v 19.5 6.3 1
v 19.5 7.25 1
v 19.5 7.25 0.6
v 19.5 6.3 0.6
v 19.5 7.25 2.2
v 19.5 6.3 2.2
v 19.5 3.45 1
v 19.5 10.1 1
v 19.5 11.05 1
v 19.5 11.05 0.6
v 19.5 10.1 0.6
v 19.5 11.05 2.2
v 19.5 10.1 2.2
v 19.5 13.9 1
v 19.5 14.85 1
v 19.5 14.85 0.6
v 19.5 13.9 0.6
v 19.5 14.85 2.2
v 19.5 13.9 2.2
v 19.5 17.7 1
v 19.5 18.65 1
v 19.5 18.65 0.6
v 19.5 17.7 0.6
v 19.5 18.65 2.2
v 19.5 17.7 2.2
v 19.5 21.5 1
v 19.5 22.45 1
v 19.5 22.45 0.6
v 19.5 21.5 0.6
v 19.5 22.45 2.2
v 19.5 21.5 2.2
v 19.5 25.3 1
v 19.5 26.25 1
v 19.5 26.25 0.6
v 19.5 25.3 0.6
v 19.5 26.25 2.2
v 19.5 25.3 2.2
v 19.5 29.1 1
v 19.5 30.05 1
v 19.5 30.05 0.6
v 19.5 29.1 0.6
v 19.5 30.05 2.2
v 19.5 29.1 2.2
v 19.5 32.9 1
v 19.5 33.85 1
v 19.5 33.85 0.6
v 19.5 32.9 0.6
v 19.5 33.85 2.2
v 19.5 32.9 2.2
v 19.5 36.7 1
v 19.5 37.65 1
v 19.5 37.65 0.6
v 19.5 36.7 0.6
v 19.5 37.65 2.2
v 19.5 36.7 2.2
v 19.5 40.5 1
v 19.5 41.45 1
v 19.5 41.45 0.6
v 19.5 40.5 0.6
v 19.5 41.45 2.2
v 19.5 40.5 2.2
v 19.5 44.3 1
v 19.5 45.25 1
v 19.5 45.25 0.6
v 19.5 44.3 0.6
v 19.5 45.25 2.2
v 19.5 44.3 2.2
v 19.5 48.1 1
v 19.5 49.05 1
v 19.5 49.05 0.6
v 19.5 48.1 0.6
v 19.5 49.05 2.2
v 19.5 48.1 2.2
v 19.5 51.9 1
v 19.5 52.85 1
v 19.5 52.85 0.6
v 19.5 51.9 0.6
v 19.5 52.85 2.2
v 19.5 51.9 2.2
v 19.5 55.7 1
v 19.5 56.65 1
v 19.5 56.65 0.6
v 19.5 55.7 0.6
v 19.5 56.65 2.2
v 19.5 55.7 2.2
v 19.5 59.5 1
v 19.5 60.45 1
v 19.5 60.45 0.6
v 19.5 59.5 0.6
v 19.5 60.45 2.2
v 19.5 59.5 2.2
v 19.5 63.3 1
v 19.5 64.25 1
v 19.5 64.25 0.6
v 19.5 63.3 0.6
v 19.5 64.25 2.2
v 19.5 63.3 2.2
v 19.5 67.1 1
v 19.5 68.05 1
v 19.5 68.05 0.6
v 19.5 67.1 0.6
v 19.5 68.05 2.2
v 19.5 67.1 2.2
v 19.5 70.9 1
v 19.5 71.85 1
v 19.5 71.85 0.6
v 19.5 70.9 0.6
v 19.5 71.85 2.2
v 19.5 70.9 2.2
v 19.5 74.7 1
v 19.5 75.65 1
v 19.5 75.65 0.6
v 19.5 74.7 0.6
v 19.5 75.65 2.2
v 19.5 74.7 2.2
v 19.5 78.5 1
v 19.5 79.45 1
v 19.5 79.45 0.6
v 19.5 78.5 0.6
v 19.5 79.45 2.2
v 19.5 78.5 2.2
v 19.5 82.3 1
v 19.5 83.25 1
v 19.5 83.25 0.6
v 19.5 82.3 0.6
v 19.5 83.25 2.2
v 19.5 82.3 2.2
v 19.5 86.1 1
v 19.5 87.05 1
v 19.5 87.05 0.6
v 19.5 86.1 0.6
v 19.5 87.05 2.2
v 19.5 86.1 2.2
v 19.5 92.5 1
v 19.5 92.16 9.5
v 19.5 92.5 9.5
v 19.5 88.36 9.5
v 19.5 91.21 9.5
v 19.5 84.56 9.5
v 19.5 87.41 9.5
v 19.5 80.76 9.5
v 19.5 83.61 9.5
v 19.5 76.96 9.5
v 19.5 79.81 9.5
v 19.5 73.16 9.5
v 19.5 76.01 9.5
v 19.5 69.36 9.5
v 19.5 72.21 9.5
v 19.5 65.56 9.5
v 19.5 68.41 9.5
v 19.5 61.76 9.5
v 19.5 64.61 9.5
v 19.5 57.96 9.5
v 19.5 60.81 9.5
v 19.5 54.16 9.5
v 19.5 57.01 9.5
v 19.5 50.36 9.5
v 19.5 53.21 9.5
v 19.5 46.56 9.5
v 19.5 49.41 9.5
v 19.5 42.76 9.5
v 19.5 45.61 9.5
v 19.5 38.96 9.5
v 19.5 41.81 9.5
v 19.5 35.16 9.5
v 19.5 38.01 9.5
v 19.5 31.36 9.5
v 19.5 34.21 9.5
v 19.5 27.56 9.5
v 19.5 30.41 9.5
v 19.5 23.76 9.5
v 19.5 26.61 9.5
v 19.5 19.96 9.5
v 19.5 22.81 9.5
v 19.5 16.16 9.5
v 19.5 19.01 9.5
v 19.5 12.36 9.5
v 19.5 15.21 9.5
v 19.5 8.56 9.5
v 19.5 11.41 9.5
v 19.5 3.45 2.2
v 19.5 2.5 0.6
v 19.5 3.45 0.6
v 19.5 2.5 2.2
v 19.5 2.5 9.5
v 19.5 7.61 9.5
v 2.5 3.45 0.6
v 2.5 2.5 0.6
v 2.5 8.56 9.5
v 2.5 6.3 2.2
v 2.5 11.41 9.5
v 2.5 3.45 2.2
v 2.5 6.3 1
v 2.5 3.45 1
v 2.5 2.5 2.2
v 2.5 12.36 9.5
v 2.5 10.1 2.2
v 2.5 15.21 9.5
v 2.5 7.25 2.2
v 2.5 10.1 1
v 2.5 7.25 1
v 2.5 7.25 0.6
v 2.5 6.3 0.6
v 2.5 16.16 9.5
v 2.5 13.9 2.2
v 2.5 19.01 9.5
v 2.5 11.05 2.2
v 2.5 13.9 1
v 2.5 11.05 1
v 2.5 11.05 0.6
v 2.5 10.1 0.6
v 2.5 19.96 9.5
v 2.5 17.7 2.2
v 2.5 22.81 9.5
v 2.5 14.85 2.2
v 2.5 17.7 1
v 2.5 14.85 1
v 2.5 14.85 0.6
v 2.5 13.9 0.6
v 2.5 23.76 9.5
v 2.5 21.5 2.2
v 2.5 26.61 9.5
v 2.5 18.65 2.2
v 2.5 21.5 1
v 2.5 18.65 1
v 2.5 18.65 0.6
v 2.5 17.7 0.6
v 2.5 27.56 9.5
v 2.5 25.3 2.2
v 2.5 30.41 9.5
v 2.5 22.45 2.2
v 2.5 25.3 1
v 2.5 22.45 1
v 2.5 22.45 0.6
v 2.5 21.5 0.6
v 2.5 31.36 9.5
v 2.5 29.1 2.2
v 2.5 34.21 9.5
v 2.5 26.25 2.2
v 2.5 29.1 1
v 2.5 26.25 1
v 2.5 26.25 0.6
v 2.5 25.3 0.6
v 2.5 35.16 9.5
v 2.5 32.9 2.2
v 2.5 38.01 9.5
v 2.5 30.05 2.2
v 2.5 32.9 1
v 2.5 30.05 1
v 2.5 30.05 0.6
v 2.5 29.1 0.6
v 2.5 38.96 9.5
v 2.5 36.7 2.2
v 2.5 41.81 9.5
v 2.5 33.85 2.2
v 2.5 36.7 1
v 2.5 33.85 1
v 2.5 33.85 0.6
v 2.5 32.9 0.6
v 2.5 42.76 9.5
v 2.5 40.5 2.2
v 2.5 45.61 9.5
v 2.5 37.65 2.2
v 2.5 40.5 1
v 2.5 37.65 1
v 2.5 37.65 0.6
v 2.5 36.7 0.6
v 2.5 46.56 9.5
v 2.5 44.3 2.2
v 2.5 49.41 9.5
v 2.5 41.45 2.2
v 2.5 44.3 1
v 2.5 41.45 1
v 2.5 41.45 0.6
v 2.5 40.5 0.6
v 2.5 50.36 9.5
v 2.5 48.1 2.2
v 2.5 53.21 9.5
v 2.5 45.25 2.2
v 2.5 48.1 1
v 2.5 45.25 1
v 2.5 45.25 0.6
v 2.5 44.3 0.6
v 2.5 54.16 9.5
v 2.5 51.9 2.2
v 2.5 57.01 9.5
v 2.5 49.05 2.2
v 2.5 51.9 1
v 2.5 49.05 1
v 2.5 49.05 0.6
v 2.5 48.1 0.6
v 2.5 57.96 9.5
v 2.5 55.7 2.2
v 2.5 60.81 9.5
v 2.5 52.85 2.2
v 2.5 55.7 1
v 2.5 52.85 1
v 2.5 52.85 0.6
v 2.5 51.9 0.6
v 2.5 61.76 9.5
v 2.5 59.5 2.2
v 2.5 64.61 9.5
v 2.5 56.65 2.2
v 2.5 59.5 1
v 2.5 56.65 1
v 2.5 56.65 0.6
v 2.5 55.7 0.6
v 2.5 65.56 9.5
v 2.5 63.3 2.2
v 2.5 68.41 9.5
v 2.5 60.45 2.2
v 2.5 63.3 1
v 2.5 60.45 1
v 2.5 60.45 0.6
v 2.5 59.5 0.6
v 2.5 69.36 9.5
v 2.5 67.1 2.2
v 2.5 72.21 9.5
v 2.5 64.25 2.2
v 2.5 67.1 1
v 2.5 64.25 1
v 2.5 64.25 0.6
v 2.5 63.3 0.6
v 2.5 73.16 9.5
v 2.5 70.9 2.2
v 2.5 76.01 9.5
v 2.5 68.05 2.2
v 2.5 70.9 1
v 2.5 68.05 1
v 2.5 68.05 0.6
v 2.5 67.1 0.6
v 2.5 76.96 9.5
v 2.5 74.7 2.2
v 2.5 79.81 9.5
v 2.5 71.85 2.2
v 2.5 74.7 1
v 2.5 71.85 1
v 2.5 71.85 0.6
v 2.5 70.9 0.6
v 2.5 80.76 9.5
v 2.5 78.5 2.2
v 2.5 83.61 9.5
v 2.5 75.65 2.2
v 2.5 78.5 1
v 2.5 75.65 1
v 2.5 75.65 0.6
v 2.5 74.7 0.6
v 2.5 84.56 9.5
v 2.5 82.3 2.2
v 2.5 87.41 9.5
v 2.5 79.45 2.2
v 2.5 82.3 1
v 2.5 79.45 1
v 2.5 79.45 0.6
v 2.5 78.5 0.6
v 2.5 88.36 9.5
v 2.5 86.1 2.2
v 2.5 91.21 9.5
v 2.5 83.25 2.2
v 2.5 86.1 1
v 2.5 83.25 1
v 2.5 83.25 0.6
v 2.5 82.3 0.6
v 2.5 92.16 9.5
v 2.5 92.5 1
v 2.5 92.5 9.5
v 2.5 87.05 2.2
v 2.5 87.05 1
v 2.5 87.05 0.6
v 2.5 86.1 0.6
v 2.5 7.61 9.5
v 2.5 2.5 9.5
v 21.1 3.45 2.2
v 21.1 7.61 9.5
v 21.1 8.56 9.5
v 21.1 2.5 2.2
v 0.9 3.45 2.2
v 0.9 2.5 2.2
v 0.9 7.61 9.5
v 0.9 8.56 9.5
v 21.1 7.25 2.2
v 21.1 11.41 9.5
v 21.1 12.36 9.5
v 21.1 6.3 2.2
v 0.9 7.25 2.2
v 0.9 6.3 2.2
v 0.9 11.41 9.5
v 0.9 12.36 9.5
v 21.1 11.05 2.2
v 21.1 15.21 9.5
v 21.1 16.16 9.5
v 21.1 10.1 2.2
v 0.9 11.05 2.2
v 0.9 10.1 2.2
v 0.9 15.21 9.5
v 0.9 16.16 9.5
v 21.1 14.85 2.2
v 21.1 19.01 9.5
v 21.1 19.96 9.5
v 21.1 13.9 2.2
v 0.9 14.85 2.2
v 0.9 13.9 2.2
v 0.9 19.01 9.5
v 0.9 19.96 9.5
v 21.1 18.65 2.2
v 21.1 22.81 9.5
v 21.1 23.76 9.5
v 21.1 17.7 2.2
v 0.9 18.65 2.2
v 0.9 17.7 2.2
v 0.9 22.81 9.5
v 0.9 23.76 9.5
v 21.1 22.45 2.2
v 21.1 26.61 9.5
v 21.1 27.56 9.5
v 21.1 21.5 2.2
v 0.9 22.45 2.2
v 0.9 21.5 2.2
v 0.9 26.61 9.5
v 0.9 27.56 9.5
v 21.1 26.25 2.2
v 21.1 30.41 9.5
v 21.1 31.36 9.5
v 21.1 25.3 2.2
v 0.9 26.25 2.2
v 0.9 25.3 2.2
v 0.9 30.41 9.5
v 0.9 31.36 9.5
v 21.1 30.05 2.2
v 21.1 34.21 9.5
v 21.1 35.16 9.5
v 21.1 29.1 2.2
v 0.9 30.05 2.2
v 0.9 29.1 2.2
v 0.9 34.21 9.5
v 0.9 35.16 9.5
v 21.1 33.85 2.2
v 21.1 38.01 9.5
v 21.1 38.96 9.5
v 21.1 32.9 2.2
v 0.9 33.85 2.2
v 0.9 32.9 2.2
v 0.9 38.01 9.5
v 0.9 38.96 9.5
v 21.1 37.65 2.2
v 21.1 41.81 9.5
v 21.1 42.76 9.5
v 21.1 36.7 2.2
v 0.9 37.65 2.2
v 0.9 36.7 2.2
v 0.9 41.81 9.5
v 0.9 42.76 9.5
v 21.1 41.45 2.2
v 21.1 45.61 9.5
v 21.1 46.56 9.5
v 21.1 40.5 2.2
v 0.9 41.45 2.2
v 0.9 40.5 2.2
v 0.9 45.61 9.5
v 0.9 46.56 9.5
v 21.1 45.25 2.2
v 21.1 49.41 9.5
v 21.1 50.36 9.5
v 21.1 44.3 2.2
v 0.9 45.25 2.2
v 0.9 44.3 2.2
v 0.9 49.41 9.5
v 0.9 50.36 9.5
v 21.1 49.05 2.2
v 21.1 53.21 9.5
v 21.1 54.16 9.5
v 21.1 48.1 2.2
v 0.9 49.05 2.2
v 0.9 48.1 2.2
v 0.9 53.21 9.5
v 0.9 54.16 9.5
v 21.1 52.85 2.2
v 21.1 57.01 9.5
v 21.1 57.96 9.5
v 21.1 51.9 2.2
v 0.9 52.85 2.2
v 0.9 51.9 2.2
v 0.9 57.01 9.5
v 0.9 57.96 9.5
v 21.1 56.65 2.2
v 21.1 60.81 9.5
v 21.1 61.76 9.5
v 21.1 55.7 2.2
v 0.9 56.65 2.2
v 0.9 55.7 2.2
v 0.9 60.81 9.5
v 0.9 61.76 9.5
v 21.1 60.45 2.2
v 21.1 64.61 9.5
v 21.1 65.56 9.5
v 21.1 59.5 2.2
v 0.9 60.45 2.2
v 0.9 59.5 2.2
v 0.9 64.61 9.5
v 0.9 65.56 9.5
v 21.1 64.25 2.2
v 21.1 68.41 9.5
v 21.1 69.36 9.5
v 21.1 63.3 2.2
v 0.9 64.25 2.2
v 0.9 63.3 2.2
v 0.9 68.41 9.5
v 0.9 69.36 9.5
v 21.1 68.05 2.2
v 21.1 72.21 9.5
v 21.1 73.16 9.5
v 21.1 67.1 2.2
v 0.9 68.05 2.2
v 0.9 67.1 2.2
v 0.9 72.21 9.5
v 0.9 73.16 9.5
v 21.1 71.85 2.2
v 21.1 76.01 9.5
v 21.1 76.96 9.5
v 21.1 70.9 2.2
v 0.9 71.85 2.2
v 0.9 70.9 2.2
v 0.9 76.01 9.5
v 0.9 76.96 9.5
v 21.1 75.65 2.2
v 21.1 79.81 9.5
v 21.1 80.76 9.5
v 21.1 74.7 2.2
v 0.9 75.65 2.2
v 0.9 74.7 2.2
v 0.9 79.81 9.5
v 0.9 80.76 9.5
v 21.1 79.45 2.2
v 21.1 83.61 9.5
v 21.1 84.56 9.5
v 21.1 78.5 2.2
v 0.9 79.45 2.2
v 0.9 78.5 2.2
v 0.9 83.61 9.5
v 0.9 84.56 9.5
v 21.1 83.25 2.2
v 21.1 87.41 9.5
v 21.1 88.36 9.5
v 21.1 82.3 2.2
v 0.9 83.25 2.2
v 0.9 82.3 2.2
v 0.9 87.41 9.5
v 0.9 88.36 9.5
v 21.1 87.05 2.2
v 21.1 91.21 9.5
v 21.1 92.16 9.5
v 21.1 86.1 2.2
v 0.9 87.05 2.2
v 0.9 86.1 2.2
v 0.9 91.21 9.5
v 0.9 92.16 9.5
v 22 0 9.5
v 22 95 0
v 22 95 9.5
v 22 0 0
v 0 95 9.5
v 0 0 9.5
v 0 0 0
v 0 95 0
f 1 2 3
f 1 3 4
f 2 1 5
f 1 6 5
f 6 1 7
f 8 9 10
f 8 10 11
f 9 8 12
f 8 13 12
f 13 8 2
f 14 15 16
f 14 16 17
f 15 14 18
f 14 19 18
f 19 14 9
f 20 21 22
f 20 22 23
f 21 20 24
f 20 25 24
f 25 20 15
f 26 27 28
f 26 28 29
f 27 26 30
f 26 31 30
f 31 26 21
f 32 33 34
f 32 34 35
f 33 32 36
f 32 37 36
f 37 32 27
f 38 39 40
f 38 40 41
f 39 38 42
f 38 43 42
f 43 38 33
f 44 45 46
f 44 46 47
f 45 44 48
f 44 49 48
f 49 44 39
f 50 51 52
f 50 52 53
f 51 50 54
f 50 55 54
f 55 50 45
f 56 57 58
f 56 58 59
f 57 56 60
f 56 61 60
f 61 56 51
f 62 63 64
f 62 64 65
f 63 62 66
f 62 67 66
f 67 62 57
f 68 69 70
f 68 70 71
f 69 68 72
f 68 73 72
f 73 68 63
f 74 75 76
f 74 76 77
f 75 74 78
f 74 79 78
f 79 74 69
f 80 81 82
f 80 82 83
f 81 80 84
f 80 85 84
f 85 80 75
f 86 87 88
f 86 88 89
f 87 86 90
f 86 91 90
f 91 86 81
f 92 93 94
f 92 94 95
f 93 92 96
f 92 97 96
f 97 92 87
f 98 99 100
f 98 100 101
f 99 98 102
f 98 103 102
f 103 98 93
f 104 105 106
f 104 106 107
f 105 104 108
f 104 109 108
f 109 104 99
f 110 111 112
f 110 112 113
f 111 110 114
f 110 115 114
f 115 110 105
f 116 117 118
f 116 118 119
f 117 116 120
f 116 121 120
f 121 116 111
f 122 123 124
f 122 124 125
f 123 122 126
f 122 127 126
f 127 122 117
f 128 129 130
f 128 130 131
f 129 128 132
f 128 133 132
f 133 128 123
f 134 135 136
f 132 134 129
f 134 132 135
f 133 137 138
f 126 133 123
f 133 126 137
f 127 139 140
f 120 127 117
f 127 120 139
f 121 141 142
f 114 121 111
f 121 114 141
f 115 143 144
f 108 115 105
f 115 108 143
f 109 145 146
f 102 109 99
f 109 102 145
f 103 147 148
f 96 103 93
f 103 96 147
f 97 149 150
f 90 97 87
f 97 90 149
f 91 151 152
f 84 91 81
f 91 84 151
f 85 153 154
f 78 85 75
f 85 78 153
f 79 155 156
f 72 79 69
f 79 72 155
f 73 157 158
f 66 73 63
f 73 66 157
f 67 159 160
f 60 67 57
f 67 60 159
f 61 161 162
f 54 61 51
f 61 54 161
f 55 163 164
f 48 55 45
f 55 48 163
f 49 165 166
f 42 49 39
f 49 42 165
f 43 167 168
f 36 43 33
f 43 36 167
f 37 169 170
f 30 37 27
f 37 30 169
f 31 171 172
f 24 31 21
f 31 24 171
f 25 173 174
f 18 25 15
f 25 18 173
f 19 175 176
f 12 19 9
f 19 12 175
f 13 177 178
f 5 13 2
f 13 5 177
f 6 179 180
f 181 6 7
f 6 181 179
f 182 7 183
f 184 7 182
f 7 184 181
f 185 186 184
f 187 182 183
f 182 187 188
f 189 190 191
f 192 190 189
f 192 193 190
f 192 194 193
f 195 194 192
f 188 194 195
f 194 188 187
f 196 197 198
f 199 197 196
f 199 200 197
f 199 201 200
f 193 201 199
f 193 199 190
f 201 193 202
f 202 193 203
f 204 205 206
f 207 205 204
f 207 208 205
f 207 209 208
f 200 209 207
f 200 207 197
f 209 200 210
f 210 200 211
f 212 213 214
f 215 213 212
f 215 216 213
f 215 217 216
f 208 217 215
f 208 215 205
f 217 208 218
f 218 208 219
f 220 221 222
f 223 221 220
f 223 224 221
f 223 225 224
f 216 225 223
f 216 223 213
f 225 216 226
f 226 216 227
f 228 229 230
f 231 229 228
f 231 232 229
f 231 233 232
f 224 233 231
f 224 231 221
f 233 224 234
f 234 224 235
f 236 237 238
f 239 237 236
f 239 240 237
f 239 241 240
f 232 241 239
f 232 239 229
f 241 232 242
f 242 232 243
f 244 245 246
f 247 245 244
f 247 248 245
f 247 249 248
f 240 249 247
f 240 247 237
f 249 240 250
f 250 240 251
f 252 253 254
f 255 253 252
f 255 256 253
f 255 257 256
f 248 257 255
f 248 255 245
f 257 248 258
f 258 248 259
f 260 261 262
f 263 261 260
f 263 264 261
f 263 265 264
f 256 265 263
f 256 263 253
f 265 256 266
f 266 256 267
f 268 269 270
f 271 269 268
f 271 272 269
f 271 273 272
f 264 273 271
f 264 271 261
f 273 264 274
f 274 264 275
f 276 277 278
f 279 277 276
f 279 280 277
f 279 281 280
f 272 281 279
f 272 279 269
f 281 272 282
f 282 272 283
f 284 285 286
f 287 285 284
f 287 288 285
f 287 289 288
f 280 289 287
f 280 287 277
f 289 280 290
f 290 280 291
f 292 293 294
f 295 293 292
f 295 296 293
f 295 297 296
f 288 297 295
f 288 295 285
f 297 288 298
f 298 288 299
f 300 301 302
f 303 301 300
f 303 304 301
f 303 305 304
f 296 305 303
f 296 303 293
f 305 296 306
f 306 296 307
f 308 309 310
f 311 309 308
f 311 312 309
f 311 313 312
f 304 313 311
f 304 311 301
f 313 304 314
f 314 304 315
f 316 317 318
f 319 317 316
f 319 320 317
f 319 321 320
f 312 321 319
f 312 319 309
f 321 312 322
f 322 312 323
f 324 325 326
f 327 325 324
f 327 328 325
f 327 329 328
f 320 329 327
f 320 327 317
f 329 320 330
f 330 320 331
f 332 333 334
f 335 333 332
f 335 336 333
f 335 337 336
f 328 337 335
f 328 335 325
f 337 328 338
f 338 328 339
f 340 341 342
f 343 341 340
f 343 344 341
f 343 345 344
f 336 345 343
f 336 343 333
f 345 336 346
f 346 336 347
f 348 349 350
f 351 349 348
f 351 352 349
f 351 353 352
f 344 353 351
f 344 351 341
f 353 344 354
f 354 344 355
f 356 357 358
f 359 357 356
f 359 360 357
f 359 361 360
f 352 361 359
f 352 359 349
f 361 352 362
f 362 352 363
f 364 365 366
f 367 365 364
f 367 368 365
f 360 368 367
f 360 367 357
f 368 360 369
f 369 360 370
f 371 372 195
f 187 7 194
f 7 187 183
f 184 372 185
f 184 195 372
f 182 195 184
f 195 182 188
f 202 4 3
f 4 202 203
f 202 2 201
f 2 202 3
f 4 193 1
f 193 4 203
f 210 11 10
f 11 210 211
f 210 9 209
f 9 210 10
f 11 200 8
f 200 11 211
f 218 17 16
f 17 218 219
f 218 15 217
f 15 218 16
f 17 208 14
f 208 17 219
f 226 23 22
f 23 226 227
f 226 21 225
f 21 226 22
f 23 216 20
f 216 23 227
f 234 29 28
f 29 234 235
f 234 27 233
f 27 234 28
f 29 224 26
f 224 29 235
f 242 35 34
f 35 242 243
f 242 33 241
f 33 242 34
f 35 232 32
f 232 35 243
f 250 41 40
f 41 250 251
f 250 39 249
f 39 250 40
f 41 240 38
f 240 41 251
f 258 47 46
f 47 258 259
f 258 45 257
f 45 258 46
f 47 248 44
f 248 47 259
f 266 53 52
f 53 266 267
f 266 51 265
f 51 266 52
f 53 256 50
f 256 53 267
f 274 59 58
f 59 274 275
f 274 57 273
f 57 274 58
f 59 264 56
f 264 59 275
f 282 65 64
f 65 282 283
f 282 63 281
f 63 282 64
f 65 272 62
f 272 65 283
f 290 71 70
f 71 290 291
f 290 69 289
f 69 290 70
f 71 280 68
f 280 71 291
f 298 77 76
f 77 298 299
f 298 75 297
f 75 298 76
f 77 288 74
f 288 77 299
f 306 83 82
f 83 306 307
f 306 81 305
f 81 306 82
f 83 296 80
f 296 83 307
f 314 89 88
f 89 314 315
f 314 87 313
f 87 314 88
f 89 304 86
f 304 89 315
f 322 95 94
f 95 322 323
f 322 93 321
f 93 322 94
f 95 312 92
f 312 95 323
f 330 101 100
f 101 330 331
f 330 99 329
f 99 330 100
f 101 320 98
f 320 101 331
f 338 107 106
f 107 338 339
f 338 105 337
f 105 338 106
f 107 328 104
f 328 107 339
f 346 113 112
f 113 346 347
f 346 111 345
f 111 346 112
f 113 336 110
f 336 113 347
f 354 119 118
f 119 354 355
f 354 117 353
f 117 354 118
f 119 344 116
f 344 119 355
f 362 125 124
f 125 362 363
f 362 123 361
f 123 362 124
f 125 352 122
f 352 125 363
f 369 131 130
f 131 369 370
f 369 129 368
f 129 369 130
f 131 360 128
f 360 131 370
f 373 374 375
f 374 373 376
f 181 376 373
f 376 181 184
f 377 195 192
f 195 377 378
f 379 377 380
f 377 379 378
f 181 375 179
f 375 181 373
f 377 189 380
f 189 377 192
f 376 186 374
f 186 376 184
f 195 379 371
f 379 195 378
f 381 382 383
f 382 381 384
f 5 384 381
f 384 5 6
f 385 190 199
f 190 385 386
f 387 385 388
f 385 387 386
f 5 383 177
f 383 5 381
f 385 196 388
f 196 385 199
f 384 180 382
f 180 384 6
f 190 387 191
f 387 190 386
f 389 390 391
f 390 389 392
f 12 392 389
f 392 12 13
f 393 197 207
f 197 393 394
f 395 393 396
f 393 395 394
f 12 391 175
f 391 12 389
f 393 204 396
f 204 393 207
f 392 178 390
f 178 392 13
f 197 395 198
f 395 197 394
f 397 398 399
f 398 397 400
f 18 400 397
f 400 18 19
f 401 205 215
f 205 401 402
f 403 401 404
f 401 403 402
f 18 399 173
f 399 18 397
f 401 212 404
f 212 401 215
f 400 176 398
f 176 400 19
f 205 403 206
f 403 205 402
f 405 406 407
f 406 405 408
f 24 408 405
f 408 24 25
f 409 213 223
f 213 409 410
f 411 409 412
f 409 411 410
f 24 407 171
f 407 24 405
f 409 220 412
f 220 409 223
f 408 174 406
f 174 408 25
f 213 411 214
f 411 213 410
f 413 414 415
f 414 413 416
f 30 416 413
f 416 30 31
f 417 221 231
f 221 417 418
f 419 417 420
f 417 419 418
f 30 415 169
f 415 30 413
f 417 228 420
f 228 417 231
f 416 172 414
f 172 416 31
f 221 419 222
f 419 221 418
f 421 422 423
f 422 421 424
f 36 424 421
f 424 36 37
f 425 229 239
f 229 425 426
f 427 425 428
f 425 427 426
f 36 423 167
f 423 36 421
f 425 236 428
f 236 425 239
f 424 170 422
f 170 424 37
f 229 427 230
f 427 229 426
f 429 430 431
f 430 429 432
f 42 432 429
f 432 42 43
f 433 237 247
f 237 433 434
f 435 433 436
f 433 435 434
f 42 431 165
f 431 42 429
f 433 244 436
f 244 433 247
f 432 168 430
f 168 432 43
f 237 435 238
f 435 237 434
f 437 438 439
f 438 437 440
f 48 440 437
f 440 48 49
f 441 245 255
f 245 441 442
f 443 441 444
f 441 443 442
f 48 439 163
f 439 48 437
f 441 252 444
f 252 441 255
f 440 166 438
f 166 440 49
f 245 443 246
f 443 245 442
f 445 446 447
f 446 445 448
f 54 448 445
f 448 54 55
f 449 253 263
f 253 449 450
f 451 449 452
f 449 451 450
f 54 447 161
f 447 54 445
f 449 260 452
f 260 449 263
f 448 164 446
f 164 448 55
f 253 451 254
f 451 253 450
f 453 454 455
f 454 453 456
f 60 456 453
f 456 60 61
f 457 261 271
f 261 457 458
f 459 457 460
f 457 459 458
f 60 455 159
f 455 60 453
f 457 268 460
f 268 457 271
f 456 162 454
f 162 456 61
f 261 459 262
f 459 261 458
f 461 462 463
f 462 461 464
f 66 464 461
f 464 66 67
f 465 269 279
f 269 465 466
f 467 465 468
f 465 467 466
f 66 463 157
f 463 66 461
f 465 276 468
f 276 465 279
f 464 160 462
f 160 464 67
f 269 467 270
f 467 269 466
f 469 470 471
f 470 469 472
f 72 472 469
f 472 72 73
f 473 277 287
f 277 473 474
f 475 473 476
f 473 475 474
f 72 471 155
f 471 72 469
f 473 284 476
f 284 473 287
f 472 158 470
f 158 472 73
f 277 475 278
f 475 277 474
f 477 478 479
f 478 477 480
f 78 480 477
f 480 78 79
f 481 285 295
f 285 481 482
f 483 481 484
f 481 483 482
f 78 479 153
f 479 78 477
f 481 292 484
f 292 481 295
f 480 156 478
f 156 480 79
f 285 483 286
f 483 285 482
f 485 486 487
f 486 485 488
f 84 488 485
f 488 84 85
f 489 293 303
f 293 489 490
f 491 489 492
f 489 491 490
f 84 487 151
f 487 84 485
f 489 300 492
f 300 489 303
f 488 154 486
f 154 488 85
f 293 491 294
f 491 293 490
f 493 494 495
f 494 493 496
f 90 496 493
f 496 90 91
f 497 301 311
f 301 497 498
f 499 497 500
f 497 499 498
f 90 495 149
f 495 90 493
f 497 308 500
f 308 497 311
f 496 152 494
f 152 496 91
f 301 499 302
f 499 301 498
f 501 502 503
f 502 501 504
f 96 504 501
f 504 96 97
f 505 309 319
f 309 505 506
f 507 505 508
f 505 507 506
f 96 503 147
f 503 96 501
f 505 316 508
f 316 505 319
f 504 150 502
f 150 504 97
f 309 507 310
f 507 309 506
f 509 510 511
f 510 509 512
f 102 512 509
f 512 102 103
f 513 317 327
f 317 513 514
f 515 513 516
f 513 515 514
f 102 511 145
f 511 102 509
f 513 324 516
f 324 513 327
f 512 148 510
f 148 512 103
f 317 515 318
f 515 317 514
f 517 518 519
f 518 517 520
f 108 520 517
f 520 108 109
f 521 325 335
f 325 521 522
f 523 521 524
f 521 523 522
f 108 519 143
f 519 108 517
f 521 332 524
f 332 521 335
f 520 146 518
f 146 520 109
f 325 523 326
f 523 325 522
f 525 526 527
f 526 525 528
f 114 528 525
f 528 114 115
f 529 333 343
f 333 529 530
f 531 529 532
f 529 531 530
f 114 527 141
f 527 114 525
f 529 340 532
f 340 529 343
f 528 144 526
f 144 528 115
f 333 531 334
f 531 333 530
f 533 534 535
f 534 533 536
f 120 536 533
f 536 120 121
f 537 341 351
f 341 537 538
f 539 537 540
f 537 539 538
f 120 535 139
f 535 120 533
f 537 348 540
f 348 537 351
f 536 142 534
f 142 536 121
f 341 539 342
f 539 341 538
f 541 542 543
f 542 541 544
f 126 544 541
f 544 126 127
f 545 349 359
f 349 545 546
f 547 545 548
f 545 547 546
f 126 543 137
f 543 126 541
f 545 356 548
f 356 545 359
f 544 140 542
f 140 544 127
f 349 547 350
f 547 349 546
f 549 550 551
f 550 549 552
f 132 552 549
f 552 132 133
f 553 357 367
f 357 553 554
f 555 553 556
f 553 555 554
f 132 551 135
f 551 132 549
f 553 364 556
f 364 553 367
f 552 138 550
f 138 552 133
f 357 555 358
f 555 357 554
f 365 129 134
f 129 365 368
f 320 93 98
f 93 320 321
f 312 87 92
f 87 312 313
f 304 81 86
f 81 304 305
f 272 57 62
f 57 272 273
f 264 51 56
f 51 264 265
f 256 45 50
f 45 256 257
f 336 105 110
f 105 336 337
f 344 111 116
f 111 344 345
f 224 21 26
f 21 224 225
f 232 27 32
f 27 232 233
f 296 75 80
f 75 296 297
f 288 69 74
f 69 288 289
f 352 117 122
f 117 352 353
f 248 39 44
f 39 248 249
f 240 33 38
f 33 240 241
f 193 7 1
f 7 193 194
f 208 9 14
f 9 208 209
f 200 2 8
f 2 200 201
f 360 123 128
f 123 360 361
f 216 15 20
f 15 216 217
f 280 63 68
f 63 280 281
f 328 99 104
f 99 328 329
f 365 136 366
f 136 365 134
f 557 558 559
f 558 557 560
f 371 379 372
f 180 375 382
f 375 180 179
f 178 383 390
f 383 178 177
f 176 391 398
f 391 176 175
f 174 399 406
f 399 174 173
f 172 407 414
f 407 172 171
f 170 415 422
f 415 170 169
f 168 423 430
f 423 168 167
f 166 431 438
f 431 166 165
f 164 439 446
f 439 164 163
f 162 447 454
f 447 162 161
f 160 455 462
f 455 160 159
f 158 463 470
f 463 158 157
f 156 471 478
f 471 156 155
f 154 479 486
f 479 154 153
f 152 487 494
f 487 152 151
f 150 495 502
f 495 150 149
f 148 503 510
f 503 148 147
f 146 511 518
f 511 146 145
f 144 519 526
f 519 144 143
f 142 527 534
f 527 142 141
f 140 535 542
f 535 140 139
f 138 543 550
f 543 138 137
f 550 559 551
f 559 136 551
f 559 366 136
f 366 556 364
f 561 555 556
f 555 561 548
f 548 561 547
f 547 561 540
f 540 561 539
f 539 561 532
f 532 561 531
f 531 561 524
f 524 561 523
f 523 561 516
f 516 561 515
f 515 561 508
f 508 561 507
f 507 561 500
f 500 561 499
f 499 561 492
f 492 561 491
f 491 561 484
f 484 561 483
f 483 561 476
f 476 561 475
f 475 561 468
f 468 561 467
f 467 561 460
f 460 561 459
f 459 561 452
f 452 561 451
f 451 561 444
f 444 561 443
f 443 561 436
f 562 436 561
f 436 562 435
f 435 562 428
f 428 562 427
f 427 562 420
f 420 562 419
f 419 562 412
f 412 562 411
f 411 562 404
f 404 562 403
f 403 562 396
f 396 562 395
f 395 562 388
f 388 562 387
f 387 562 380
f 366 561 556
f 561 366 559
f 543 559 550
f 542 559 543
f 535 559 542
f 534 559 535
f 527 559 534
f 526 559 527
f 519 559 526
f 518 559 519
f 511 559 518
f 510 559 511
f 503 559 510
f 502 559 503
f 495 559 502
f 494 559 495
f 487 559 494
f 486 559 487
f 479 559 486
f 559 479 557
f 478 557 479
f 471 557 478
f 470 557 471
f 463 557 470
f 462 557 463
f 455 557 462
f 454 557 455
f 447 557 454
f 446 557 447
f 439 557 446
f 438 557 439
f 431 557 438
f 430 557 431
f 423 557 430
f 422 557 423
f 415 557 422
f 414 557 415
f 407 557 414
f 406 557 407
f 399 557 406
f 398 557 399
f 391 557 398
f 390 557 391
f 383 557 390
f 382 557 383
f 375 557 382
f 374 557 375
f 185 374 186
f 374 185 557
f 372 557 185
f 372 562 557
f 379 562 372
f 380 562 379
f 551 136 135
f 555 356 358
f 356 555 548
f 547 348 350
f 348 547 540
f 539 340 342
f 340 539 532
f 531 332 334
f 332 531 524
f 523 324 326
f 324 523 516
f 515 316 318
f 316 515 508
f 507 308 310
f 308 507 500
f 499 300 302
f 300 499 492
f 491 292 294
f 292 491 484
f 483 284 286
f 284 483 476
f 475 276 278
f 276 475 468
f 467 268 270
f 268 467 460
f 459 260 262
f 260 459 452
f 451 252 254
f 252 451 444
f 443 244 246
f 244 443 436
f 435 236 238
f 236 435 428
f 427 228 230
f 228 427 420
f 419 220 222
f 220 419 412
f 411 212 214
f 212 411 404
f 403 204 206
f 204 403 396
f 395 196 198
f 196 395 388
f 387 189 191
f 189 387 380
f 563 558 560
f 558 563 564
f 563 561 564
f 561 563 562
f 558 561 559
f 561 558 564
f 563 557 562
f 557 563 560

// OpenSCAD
hexHeight = 50;
hexRadius = hexHeight / 1.7320508;
trayDepth = 20;
floorDepth = 1;
cutoutWidth = hexHeight * 0.35;
wallThickness = 0.6;

module hexgrid(nc,nr,bottomCutout,halfRow) {
    for (row=[0:nr-1]) {
        for (col=[0:nc-1]) {
            if (!halfRow || row || (col%2)) translate([
                col * 1.5 * hexRadius,
                ((col%2)? hexRadius * 0.866025 : 0) + row * hexHeight,0]) {
                difference() {
                    cylinder(h=trayDepth,r=hexRadius,$fn=6);
                    translate([0,0,floorDepth]) {
                        cylinder(h=trayDepth,r=hexRadius-wallThickness,$fn=6);
                    }
                    for (r=[0:120:240]) {
                        rotate([0,0,r]) {
                            translate([0,0,floorDepth+cutoutWidth]) {
                                cube([cutoutWidth,hexRadius*2,trayDepth],true);
                            }
                        translate([0,0,floorDepth+cutoutWidth/2]) {
                            rotate([90,0,0]) {
                                cylinder(h=hexRadius*2,r=cutoutWidth/2,center=true);
                            }
                       }
                    }
                     }
                    if (bottomCutout)
                        cylinder(h=trayDepth,r=hexRadius*0.7,$fn=6);
                }
            }
        }
    }
}

chitSize = 17;

module playerTray() {
    // 140mm x 92mm is one quarter the folded game board
    trayWidth = 22; // Was 150
    trayHeight = 95;
    numLanes = 1;
    gutter = (trayWidth - (chitSize * numLanes)) / (numLanes+1);
    chitThickness = 1.9;
    step = chitThickness * 2;
    pegSize = 2;
    sepDepth = 1.6;

    module lane(col) {
        size = trayHeight - gutter - gutter;
        M = [ [ 1  , 0  , 0  , -sepDepth   ],
              [ 0  , 1  , 0.7, 0   ],  // The "0.7" is the skew value; pushed along the y axis as z changes.
              [ 0  , 0  , 1  , 0.8   ],
              [ 0  , 0  , 0  , 1   ] ] ;
        translate([col * (chitSize + gutter) + gutter,gutter,floorDepth]) {
            cube([chitSize,size,chitSize]);
            for (n=[0:step:size-step]) {
                translate([0,n,-0.4]) {
                    cube([chitSize,chitThickness/2,chitSize]);
                }
            }
            for (n=[0:step:size-step]) {
                translate([0,n,0.4]) {
                    multmatrix(M) {
                        cube([chitSize + sepDepth*2,chitThickness/2,chitSize]);
                    }
                }
            }
        }
    }

    difference() {
        cube([trayWidth,trayHeight,chitSize * 0.5 + floorDepth]);
        for (l=[0:numLanes-1])
            lane(l);
    }
}

/* module wedge(num) {
    step = chitSize;
    sizeX = chitSize * cos(60);
    sizeY = chitSize * sin(60);
    for (i=[0:step:num*step]) for (j=[0:step:num*step])
        translate([i,j,0]) {
        linear_extrude(chitSize-0.2) {
            polygon([[0,0], [sizeX,0], [sizeX,sizeY]]);
        }
    }
} */

module separator(list) {
    cols = floor(sqrt(len(list)));
    cellSize = chitSize * 1.5;
    for (i=[0:len(list)-1]) {
        translate([(i % cols) * cellSize,floor(i / cols) * cellSize,0]) {
            cube([chitSize + 1.8,chitSize,0.6]);
            translate([chitSize/2 + 0.9,chitSize - 0.4,0.6]) {
                linear_extrude(0.6) {
                    text(text=list[i],size=len(list[i])>5?4:5,halign="center",valign="top");
                }
            }
        }
    }
}


// hexgrid(4,3,true,false);
// hexgrid(4,3,true,true);
playerTray();
//separator(["Base","BB","Sc","MS","Colony","Raider","Unique","SY","Titan"]);
// wedge(1);
        
            
